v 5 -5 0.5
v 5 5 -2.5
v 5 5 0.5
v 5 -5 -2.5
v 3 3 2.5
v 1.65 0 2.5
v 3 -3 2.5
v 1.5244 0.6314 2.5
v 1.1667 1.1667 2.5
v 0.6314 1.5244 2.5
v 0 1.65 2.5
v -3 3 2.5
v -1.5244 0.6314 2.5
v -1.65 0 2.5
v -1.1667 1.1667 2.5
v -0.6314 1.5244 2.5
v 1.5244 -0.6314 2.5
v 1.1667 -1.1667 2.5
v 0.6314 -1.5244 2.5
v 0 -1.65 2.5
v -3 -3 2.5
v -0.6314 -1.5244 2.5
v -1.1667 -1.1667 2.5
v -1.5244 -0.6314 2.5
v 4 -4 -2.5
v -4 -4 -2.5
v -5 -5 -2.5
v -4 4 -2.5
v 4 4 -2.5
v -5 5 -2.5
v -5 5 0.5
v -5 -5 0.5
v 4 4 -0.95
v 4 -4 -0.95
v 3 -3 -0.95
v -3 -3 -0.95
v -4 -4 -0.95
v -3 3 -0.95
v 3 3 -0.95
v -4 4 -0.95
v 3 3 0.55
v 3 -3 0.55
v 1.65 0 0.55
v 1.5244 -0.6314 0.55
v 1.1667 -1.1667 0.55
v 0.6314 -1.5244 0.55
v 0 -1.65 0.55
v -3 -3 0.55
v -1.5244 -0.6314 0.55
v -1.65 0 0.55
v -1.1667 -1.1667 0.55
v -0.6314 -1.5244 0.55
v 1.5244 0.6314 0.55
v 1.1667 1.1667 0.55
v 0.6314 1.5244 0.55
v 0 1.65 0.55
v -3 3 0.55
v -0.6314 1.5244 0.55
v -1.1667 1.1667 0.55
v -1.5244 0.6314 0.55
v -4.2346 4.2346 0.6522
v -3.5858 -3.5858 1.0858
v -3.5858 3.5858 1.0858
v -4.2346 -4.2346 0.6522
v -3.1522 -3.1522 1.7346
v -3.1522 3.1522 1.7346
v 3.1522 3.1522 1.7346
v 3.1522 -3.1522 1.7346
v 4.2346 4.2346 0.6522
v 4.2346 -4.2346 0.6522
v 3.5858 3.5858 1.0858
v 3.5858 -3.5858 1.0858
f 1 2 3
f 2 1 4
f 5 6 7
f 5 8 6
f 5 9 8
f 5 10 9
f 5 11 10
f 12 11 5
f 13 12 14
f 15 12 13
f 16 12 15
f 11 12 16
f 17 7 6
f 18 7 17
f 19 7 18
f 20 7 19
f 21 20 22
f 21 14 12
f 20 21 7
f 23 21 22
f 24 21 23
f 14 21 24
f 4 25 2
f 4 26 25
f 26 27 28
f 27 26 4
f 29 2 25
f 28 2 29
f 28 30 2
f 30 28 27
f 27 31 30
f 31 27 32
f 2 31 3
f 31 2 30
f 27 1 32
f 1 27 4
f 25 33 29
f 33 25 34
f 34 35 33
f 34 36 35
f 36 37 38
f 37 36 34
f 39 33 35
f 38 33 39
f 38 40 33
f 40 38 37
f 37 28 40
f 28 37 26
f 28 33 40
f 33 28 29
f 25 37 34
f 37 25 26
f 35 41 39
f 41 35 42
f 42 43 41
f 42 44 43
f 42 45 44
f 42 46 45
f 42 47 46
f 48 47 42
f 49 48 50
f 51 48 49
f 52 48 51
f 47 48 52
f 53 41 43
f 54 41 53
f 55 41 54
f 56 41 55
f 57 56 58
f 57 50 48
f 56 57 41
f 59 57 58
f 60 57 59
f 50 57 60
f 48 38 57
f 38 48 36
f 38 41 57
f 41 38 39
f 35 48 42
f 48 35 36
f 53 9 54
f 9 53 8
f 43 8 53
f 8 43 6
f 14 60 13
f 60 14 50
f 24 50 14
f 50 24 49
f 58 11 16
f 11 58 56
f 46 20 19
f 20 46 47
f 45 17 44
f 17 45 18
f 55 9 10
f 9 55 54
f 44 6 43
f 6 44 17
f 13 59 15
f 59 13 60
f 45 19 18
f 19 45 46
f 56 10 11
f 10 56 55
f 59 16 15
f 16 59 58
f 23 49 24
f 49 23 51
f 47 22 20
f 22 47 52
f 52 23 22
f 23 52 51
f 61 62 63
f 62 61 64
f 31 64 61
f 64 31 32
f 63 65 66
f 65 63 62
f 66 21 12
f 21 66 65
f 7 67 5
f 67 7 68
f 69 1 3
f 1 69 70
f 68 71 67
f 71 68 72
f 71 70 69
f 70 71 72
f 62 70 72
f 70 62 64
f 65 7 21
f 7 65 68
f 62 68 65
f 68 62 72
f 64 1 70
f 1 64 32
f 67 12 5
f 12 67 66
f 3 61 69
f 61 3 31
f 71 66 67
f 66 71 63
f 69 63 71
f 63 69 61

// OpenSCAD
module catenary_riser() {
	difference() {
		cube([10,10,5], center=true);
		translate([0,0,-2])
			cube([8,8,2.1], center=true);
		translate([0,0,-1])
			cube([6,6,3.1], center=true);
		cylinder(r=1.65,h=10, center=true, $fn=16);
		rotate([90,0,0])
			translate([-5,2.5,0])
				cylinder(r=2,h=12, center=true, $fn=16);
		rotate([90,0,0])
			translate([5,2.5,0])
				cylinder(r=2,h=12, center=true, $fn=16);
		rotate([90,0,90])
			translate([-5,2.5,0])
				cylinder(r=2,h=12, center=true, $fn=16);
		rotate([90,0,90])
			translate([5,2.5,0])
				cylinder(r=2,h=12, center=true, $fn=16);
	}
}

module catenary_riser_pack() {
	for(i=[0:9]) {
		for(j=[0:9]) {
			translate([12 * i, 12 *j, 0])
				catenary_riser();
		}
		translate([4+12 * i,2,-2])
			cube([1,110, 1]);
	}
	translate([3, 64,-2])
		cube([110,1,1]);
}

catenary_riser();
